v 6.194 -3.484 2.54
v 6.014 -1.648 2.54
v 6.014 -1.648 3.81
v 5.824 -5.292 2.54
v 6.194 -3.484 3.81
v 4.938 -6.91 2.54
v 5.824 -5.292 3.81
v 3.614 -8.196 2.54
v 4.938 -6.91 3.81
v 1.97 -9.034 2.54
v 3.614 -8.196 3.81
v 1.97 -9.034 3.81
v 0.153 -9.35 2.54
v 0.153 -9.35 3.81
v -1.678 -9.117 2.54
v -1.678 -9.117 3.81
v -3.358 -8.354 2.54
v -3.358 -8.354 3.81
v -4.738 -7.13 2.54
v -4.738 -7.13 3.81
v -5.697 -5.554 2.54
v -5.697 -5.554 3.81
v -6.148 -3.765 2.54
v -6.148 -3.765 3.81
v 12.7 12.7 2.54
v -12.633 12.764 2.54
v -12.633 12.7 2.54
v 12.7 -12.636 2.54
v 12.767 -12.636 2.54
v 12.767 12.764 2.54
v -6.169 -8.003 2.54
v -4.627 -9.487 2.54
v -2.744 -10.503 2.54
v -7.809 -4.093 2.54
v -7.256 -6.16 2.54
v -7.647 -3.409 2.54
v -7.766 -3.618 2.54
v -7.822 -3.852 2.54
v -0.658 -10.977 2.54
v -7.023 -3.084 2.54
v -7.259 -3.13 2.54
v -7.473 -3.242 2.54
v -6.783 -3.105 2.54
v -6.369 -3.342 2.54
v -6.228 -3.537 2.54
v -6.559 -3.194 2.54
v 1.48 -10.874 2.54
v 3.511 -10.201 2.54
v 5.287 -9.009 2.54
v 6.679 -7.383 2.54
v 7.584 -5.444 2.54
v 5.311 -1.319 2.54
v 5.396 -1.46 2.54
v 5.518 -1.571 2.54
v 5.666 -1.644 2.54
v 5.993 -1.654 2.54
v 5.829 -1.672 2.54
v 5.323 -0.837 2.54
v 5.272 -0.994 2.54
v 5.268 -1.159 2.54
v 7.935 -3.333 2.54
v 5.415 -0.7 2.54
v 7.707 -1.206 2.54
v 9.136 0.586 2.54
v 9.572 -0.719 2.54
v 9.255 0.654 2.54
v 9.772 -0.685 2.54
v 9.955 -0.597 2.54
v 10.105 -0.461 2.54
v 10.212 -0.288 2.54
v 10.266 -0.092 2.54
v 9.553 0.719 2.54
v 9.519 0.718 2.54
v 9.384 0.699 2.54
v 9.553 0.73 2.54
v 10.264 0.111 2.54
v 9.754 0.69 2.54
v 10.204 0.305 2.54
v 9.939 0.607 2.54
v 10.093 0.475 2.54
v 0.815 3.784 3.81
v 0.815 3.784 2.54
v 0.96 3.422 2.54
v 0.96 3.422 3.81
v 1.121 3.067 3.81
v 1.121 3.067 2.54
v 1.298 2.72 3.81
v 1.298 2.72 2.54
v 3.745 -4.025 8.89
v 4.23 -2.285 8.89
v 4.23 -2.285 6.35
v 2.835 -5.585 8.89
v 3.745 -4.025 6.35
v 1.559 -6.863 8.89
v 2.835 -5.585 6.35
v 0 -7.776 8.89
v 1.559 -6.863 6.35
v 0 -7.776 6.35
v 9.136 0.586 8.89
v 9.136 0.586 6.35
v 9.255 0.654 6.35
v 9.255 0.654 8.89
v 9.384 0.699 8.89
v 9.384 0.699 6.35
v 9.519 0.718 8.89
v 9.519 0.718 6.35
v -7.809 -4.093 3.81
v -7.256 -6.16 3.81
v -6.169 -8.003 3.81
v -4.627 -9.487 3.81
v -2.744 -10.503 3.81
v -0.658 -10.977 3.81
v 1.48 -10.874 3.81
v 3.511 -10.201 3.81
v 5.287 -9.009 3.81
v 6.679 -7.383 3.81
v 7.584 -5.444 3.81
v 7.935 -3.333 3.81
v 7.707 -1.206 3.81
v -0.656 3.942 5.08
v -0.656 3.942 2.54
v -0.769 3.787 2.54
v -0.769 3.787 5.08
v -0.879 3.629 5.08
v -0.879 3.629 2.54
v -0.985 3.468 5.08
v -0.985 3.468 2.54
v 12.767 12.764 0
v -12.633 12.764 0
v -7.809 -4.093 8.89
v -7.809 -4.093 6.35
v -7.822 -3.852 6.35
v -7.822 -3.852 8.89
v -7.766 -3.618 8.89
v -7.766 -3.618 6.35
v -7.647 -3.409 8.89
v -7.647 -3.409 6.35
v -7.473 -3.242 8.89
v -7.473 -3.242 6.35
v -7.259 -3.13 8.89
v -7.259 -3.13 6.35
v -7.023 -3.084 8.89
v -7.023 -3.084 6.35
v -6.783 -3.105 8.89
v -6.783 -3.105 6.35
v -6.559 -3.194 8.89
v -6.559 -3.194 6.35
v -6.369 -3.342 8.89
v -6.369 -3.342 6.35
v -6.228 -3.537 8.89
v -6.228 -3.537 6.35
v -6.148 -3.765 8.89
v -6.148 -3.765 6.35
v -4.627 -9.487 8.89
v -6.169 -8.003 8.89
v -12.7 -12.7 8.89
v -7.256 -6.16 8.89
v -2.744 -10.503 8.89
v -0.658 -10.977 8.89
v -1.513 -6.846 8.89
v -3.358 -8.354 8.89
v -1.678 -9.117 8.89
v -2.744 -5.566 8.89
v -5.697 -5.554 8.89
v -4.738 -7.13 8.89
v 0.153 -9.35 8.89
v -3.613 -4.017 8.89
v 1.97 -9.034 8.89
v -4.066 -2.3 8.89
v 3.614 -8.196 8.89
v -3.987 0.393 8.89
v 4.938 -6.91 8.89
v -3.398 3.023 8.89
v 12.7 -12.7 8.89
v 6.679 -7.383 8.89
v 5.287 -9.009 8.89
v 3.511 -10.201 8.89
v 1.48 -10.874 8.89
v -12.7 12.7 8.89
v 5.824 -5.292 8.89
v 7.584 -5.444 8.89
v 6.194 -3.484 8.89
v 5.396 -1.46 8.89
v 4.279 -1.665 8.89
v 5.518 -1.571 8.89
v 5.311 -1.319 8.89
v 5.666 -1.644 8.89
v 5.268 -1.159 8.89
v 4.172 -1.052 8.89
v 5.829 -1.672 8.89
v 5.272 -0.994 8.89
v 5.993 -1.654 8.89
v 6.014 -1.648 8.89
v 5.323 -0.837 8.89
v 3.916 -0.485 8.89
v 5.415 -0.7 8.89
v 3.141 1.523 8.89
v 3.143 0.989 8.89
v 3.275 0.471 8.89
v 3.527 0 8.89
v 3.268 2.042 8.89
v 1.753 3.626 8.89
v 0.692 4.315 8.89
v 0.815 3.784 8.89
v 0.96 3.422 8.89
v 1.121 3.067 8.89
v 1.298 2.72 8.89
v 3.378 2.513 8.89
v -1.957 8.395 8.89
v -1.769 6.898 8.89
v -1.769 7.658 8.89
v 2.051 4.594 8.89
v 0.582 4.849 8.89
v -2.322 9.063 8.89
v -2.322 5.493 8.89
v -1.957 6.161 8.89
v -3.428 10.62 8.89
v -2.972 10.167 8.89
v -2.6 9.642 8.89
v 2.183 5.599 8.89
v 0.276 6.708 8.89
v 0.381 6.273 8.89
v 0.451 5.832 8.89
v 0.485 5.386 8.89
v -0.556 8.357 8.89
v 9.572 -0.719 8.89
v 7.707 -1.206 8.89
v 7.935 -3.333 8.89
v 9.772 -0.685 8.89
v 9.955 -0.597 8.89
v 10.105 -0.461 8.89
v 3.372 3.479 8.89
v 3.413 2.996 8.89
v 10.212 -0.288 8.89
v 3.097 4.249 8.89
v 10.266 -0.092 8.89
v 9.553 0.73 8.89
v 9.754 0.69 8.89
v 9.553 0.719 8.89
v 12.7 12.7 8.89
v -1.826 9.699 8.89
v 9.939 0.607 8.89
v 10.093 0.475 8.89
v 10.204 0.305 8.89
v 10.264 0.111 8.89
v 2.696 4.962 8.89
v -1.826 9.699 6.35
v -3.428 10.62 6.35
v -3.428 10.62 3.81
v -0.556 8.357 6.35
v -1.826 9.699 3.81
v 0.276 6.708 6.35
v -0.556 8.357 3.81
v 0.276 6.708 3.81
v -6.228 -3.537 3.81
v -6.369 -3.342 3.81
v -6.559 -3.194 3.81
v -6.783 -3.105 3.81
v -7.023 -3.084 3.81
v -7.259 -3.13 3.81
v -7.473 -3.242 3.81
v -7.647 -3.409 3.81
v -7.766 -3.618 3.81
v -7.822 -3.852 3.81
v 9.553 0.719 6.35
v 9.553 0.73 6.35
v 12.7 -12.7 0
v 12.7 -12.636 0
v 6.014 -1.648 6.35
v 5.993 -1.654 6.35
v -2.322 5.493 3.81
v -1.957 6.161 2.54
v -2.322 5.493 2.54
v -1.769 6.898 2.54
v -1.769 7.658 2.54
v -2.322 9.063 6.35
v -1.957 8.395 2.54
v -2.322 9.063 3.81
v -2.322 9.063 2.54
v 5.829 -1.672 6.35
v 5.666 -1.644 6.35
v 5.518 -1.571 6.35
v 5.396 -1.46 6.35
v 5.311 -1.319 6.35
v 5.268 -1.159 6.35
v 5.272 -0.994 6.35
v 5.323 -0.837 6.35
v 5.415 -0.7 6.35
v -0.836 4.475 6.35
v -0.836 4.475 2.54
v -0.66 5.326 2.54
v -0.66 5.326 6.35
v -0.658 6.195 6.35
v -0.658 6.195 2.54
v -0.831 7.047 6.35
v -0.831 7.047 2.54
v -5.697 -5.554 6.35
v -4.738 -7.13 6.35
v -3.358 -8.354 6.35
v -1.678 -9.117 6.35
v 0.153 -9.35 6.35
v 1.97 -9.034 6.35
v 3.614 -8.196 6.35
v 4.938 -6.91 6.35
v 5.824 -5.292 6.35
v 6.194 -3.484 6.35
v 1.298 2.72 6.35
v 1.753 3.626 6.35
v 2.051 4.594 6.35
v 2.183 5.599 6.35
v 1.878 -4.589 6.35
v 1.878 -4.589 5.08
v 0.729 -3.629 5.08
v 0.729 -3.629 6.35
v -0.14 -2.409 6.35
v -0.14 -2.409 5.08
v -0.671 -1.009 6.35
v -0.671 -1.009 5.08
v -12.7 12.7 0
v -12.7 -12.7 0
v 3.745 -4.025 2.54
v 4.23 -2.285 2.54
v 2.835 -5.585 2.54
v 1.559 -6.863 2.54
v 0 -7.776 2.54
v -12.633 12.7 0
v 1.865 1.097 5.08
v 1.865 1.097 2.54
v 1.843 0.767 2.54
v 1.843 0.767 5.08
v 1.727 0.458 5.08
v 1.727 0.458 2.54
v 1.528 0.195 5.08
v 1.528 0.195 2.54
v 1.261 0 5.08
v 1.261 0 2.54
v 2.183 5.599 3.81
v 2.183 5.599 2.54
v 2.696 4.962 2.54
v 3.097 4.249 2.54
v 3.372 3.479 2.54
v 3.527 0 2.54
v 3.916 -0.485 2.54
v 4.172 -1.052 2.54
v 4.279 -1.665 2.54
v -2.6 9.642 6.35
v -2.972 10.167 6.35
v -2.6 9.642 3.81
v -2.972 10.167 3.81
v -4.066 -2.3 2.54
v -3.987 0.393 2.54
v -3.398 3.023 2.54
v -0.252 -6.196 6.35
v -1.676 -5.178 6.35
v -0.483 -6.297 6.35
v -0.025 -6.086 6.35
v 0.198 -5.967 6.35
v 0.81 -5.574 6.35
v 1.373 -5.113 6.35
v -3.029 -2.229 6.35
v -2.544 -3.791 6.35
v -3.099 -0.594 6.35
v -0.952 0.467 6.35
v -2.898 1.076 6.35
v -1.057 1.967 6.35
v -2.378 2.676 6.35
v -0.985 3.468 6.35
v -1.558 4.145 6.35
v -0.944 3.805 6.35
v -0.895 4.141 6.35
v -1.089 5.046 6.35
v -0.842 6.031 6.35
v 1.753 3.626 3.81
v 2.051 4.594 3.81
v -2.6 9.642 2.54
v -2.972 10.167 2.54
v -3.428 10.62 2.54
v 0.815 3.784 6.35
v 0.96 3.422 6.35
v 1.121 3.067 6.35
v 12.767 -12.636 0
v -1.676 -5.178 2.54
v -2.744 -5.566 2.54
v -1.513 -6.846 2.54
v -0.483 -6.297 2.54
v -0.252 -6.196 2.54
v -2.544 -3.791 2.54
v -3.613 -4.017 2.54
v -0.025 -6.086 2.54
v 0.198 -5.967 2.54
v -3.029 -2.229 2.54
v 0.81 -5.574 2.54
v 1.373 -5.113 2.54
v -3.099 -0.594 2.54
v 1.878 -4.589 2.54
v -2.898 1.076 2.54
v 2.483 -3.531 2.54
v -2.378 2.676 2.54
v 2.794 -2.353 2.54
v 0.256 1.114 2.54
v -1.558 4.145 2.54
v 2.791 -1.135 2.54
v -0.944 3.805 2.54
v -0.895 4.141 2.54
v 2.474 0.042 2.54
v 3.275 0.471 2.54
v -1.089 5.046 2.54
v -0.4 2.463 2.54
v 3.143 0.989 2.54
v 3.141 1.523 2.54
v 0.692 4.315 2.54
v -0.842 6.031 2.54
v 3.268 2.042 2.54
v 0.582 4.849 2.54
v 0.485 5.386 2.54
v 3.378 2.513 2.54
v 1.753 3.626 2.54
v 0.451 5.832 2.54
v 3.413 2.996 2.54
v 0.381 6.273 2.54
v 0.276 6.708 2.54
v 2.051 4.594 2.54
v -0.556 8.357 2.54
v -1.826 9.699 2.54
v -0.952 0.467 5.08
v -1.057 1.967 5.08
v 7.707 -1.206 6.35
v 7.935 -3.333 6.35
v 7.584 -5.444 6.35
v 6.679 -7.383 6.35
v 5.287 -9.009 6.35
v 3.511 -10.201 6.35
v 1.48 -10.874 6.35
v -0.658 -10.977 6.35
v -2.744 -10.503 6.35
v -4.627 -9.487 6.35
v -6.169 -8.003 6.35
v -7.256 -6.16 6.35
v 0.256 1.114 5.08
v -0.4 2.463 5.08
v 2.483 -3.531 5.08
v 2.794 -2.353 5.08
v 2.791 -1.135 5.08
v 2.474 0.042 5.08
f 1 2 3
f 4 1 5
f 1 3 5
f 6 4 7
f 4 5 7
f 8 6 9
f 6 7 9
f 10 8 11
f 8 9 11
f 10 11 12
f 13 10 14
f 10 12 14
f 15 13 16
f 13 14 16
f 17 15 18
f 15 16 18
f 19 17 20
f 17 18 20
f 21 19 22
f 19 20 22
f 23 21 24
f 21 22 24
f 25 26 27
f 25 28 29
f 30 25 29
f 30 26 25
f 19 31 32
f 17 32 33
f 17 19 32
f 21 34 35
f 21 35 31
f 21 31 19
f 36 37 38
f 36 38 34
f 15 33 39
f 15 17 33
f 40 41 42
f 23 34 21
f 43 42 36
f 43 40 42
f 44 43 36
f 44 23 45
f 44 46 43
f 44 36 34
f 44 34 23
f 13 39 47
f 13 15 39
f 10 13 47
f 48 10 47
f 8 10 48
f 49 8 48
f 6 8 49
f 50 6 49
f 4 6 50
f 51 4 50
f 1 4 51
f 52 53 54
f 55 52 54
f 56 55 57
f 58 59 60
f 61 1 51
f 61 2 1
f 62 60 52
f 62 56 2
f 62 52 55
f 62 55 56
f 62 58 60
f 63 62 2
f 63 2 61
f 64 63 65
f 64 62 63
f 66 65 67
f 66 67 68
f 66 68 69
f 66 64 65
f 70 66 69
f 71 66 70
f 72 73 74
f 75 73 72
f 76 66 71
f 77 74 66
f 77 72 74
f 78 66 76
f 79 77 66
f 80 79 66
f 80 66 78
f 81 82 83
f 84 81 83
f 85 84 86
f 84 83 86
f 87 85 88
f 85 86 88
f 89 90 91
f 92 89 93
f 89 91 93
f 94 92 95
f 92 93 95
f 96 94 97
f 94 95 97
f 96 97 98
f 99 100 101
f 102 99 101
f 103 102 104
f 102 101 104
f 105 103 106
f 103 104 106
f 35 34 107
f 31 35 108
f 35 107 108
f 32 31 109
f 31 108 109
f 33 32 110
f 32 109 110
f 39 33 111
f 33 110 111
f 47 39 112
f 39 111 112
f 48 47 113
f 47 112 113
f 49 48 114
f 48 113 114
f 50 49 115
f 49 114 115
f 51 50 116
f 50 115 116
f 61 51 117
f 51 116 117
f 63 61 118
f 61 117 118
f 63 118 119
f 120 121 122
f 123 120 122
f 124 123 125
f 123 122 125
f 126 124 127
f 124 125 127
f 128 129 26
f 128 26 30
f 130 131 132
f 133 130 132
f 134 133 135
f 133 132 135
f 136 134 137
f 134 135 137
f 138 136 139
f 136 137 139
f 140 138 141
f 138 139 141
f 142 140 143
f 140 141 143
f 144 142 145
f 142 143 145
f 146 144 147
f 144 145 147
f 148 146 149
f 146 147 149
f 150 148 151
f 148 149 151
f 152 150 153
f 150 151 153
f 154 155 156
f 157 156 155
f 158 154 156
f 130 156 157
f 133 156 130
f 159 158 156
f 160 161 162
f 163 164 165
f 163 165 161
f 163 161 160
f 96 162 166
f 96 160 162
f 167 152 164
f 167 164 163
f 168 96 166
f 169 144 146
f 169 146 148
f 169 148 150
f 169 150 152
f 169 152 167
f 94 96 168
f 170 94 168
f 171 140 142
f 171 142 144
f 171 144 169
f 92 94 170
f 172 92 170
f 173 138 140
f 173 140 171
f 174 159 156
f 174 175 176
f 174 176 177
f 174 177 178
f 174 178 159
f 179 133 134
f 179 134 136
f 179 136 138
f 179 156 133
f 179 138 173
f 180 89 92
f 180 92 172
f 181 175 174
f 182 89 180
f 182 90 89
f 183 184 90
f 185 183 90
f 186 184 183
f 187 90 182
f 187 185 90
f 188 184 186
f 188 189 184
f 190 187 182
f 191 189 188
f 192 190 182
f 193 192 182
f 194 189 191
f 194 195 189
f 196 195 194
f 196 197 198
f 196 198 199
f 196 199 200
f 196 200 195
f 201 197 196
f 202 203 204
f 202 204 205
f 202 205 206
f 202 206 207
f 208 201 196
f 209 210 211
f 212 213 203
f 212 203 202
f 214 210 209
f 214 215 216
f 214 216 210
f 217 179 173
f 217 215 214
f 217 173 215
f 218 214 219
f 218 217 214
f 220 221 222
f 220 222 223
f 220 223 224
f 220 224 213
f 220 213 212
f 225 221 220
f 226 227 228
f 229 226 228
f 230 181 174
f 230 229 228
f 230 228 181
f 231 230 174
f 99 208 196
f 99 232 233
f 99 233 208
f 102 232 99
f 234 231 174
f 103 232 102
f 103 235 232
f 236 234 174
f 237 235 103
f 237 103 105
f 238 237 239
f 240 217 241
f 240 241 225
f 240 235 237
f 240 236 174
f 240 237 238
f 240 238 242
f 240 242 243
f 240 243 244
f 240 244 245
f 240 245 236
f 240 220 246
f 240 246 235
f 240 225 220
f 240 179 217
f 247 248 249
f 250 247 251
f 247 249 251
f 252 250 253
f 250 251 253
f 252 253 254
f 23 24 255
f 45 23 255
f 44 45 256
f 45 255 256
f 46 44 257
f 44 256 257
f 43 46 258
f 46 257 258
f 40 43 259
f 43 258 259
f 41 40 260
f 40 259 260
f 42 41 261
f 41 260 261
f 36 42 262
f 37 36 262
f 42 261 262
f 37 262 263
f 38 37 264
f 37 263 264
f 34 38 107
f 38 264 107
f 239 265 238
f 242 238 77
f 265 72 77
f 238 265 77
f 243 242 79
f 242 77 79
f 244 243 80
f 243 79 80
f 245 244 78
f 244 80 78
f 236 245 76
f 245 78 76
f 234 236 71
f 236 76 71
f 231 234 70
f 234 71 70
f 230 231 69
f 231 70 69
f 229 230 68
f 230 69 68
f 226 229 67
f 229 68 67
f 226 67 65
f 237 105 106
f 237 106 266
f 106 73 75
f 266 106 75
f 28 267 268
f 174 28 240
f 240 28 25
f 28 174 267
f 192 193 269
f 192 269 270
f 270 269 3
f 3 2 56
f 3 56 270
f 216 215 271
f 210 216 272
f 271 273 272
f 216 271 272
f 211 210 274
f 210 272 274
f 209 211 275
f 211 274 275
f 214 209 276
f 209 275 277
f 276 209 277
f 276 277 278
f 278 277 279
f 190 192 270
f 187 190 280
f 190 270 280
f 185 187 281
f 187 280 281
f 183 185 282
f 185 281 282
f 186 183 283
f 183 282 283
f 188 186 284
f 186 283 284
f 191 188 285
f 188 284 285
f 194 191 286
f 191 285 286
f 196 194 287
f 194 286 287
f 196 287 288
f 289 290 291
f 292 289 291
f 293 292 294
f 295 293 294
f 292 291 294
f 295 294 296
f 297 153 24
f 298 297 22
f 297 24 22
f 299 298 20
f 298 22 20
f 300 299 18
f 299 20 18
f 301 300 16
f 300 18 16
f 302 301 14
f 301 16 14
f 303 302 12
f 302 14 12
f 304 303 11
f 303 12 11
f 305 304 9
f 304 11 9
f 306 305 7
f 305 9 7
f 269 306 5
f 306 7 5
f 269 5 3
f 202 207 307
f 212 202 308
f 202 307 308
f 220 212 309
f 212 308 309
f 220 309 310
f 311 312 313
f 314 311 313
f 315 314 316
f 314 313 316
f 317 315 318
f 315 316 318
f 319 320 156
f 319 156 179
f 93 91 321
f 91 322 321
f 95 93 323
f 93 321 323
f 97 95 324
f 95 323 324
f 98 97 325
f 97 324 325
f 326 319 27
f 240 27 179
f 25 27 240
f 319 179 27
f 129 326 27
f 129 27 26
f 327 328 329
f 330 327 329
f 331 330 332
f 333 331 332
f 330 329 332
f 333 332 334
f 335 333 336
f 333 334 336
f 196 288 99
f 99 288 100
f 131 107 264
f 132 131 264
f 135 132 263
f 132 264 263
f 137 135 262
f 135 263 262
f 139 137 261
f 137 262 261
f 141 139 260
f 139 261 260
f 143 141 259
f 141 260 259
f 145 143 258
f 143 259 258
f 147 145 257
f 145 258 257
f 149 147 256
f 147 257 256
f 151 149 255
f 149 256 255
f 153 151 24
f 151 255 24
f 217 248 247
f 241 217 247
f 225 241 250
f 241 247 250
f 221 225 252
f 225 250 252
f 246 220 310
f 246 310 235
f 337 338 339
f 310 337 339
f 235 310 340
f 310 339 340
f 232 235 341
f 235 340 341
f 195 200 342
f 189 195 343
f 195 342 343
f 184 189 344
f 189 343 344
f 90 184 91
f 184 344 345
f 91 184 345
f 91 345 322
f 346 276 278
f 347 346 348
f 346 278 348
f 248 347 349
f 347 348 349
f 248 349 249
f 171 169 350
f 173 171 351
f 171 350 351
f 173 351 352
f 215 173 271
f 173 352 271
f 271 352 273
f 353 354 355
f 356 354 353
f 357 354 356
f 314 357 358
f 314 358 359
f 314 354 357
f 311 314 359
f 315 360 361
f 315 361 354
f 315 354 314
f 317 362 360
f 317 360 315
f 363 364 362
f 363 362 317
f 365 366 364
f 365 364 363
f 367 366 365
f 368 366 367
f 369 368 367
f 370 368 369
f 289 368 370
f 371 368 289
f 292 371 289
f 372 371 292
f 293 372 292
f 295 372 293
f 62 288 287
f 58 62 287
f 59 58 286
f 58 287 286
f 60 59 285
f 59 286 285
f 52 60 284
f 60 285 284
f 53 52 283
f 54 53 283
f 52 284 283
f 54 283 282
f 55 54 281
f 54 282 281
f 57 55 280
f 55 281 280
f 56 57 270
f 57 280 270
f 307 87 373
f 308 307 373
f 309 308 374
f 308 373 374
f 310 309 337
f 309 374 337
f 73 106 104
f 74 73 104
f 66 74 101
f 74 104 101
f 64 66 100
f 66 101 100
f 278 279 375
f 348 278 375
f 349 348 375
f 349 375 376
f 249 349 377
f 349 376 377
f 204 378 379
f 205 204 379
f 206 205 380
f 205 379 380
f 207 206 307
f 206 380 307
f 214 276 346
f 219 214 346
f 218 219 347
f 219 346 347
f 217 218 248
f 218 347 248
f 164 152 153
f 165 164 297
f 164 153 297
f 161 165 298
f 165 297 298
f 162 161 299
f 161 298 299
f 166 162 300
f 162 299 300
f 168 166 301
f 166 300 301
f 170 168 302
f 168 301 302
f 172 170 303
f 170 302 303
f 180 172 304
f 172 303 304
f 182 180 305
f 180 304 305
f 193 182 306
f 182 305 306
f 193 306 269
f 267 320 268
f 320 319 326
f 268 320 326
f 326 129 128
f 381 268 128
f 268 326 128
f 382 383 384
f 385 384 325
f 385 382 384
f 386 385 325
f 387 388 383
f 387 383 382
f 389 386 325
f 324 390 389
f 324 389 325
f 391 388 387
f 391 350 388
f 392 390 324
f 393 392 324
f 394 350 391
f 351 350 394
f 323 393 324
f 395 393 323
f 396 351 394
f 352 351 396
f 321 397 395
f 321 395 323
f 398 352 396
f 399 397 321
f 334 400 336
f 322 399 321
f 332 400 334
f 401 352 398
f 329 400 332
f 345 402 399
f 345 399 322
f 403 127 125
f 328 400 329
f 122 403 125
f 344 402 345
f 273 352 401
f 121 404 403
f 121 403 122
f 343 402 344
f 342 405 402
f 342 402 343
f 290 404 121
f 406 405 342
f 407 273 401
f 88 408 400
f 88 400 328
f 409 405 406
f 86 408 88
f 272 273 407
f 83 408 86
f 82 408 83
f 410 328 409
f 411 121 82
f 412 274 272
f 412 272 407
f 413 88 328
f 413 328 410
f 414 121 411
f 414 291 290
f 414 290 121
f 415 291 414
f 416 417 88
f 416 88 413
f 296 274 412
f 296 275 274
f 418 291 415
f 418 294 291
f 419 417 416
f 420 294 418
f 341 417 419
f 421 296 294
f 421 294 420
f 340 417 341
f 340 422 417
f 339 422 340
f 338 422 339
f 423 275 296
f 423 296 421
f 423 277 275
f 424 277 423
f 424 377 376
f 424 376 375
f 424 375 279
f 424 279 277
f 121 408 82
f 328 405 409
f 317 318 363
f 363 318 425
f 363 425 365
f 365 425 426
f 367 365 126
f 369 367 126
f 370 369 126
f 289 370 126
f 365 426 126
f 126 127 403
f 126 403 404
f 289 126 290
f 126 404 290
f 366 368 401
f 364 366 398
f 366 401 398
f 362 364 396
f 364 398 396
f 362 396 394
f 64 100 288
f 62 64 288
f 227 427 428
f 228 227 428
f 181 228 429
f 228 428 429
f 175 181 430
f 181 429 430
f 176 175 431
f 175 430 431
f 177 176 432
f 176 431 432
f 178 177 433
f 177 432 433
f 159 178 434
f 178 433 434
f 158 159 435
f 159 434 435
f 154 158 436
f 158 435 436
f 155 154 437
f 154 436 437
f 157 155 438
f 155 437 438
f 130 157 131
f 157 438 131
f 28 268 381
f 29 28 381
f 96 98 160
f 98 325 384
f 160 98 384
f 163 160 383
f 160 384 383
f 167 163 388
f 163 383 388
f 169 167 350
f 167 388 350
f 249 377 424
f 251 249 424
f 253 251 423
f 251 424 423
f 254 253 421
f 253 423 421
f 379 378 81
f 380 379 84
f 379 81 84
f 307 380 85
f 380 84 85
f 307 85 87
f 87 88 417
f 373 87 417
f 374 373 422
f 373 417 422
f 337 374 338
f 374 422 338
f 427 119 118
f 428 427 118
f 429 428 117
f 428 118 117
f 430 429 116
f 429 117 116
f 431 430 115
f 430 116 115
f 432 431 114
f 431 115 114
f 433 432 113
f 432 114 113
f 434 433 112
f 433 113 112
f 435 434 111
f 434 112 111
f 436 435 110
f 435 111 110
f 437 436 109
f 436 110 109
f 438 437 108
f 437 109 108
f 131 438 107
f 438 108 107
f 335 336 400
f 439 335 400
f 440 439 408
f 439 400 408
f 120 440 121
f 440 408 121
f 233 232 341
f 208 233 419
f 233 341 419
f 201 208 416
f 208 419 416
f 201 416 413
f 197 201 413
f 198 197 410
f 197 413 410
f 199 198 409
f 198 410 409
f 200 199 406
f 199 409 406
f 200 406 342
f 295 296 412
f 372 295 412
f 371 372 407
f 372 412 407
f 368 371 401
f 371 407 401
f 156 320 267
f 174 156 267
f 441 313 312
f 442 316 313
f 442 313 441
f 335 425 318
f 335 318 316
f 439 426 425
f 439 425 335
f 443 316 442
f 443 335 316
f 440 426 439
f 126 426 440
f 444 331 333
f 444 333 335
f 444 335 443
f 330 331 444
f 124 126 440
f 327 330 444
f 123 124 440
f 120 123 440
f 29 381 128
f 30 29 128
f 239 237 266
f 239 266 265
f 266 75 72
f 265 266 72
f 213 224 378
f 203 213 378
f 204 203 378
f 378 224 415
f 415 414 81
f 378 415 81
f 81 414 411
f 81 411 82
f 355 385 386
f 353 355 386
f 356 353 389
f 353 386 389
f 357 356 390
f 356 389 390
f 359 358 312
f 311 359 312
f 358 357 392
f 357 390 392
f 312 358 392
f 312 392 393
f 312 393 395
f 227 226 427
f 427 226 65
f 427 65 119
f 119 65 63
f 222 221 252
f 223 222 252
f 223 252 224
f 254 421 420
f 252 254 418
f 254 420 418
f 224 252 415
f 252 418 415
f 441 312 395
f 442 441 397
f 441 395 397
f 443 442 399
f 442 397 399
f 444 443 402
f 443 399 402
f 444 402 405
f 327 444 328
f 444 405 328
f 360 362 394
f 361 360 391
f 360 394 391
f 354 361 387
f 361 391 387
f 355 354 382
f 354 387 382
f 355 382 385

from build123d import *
from build123d import SkipClean  # not in build123d's __all__

# Parameters (mm, degrees)
F0_W      = 25.4
F0_H      = 25.4
F1_DEPTH  = 3.81
F3_DEPTH  = 6.35
F4_W      = 25.4
F4_H      = 25.4
F1_FACE_W = 25.4
F1_FACE_H = 25.4
F5_DEPTH  = 2.54
F7_DEPTH  = 3.81
F5_FACE_W = 25.4
F5_FACE_H = 25.4
F8_DEPTH  = 2.54
F9_DEPTH  = 6.35
F10_DEPTH = 5.08


# Not quite as in the source:
# - a feature names something its author has since deleted; it is built from what else it names


with BuildPart() as f1:
    # F0 (on Top) → F1 (new body)
    with BuildSketch(Plane.XY):
        Rectangle(F0_W, F0_H)
        with BuildLine():
            ThreePointArc((-2.3220747757, 5.493318662), (-1.7452180631, 7.2779146179), (-2.3220747757, 9.0625105738))
            ThreePointArc((-2.3220747757, 9.0625105738), (-2.7746823601, 9.912386532), (-3.427619813, 10.62006969))
            ThreePointArc((-3.427619813, 10.62006969), (-1.1425772736, 9.0743071478), (0.2757107432, 6.7080315202))
            ThreePointArc((0.2757107432, 6.7080315202), (0.4204105595, 6.0532877613), (0.4851105891, 5.3858738471))
            ThreePointArc((0.4851105891, 5.3858738471), (0.6353827008, 4.5817890382), (0.8147705941, 3.7836950142))
            ThreePointArc((0.8147705941, 3.7836950142), (1.0381967432, 3.2437817697), (1.2981665786, 2.7204833459))
            ThreePointArc((1.2981665786, 2.7204833459), (1.922383445, 4.1038367613), (2.1830380429, 5.5989529938))
            ThreePointArc((2.1830380429, 5.5989529938), (2.9114948167, 4.6138465954), (3.372413034, 3.4786645464))
            ThreePointArc((3.372413034, 3.4786645464), (3.4051009388, 2.7541360468), (3.2676233133, 2.0420195197))
            ThreePointArc((3.2676233133, 2.0420195197), (3.1432548322, 0.9887032001), (3.5271933302, 0))
            ThreePointArc((3.5271933302, 0), (4.1724784116, -1.0519502273), (4.2296264741, -2.2847219888))
            ThreePointArc((4.2296264741, -2.2847219888), (2.8346650657, -5.5849174863), (0, -7.7762370929))
            ThreePointArc((0, -7.7762370929), (-2.7435493808, -5.5658105565), (-4.0658875369, -2.3001604713))
            ThreePointArc((-4.0658875369, -2.3001604713), (-3.7552495624, 1.7221644716), (-2.3220747757, 5.493318662))
        make_face(mode=Mode.SUBTRACT)
    extrude(amount=F1_DEPTH)

    # F2 (on face) → F3 (cut)
    with BuildSketch(Plane.XY.offset(3.81)):
        with BuildLine():
            ThreePointArc((-6.1483882188, -3.7645904891), (-7.1429274149, -3.0984661258), (-7.8090517782, -4.0930053219))
            ThreePointArc((-7.8090517782, -4.0930053219), (1.9937266905, -10.7603517397), (7.3875300738, -0.2031334023))
            ThreePointArc((7.3875300738, -0.2031334023), (6.5005634578, -0.4457360723), (5.8456538245, -1.0912275175))
            ThreePointArc((5.8456538245, -1.0912275175), (1.3588648275, -9.2035644572), (-6.1483882188, -3.7645904891))
        make_face()
    extrude(amount=-F3_DEPTH, mode=Mode.SUBTRACT)



with BuildPart() as f1b:
    # F0 (on Top) → F1, piece 2 (new body)
    with BuildSketch(Plane.XY):
        with BuildLine():
            ThreePointArc((1.2607348617, 0), (-0.1199112872, 1.7654494083), (-0.65563916, 3.941682633))
            ThreePointArc((-0.65563916, 3.941682633), (-0.8248612998, 3.7079174894), (-0.9848921893, 3.4677667255))
            ThreePointArc((-0.9848921893, 3.4677667255), (-1.0263163384, 1.2153133206), (-0.671251677, -1.009364496))
            ThreePointArc((-0.671251677, -1.009364496), (0.2551522442, -3.0470440914), (1.8780454732, -4.5886601027))
            ThreePointArc((1.8780454732, -4.5886601027), (2.8324677453, -1.7438067709), (1.8650756683, 1.0966623668))
            ThreePointArc((1.8650756683, 1.0966623668), (1.7272115994, 0.4577864308), (1.2607348617, 0))
        make_face()
        with BuildLine():
            ThreePointArc((-0.671251677, -1.009364496), (-1.0263163384, 1.2153133206), (-0.9848921893, 3.4677667255))
            ThreePointArc((-0.9848921893, 3.4677667255), (-2.0972329272, -1.4632517602), (0.1975684196, -5.9672646379))
            ThreePointArc((0.1975684196, -5.9672646379), (1.0982734454, -5.351669196), (1.8780454732, -4.5886601027))
            ThreePointArc((1.8780454732, -4.5886601027), (0.2551522442, -3.0470440914), (-0.671251677, -1.009364496))
        make_face()
        with BuildLine():
            ThreePointArc((0.1975684196, -5.9672646379), (-2.0972329272, -1.4632517602), (-0.9848921893, 3.4677667255))
            ThreePointArc((-0.9848921893, 3.4677667255), (-0.9205654294, 3.97292477), (-0.8361481014, 4.4751162641))
            ThreePointArc((-0.8361481014, 4.4751162641), (-0.6366469014, 5.7604618421), (-0.8311524871, 7.0465728641))
            ThreePointArc((-0.8311524871, 7.0465728641), (-0.9366764425, 5.531166985), (-1.5578314768, 4.1448925869))
            ThreePointArc((-1.5578314768, 4.1448925869), (-2.6769387693, 1.8887344687), (-3.0985642225, -0.5941836862))
            ThreePointArc((-3.0985642225, -0.5941836862), (-2.5441879685, -3.7912333048), (-0.4829827521, -6.2972046435))
            ThreePointArc((-0.4829827521, -6.2972046435), (-0.1377056519, -6.1425510207), (0.1975684196, -5.9672646379))
        make_face()
    extrude(amount=F1_DEPTH)


with BuildPart() as f1_1:
    add(f1.part, clean=False)

    with SkipClean():  # cleaning this boolean's faces spoils the solid; the shape is the same uncleaned
        add(f1b.part)  # F5 merges F1b
    # F4 (on Top) + F1_face (on face) → F5 (join)
    with BuildSketch(Plane.XY):
        with Locations((0.066815722, 0.0637920246)):
            Rectangle(F4_W, F4_H)
    with BuildSketch(Plane(origin=(0.026992419, 0.041114738, 3.81), x_dir=(1, 0, 0), z_dir=(0, 0, 1))):
        with Locations((-0.026992419, -0.041114738)):
            Rectangle(F1_FACE_W, F1_FACE_H)
        with BuildLine():
            ThreePointArc((-7.8360441972, -4.1341200599), (-7.1699198339, -3.1395808638), (-6.1753806378, -3.805705227))
            ThreePointArc((-6.1753806378, -3.805705227), (1.3318724085, -9.2446791952), (5.8186614055, -1.1323422554))
            ThreePointArc((5.8186614055, -1.1323422554), (6.4735710387, -0.4868508103), (7.3605376548, -0.2442481402))
            ThreePointArc((7.3605376548, -0.2442481402), (1.9667342715, -10.8014664776), (-7.8360441972, -4.1341200599))
        make_face(mode=Mode.SUBTRACT)
        with BuildLine():
            ThreePointArc((-0.026992419, -7.8173518309), (-2.7705417999, -5.6069252945), (-4.0928799559, -2.3412752093))
            ThreePointArc((-4.0928799559, -2.3412752093), (-3.7822419814, 1.6810497336), (-2.3490671947, 5.4522039241))
            ThreePointArc((-2.3490671947, 5.4522039241), (-1.7722104822, 7.23679988), (-2.3490671947, 9.0213958359))
            ThreePointArc((-2.3490671947, 9.0213958359), (-2.8016747791, 9.871271794), (-3.454612232, 10.5789549521))
            ThreePointArc((-3.454612232, 10.5789549521), (-1.1695696926, 9.0331924098), (0.2487183241, 6.6669167823))
            ThreePointArc((0.2487183241, 6.6669167823), (0.3934181404, 6.0121730233), (0.4581181701, 5.3447591091))
            ThreePointArc((0.4581181701, 5.3447591091), (0.6083902818, 4.5406743002), (0.787778175, 3.7425802762))
            ThreePointArc((0.787778175, 3.7425802762), (1.0112043242, 3.2026670317), (1.2711741596, 2.6793686079))
            ThreePointArc((1.2711741596, 2.6793686079), (1.895391026, 4.0627220233), (2.1560456238, 5.5578382558))
            ThreePointArc((2.1560456238, 5.5578382558), (2.8845023977, 4.5727318574), (3.345420615, 3.4375498084))
            ThreePointArc((3.345420615, 3.4375498084), (3.3781085198, 2.7130213089), (3.2406308943, 2.0009047817))
            ThreePointArc((3.2406308943, 2.0009047817), (3.1162624132, 0.9475884621), (3.5002009112, -0.041114738))
            ThreePointArc((3.5002009112, -0.041114738), (4.1454859925, -1.0930649653), (4.2026340551, -2.3258367268))
            ThreePointArc((4.2026340551, -2.3258367268), (2.8076726467, -5.6260322243), (-0.026992419, -7.8173518309))
        make_face(mode=Mode.SUBTRACT)
    with SkipClean():  # cleaning this boolean's faces spoils the solid; the shape is the same uncleaned
        extrude(amount=F5_DEPTH)

    # F6 (on face) → F7 (cut)
    with BuildSketch(Plane.XY.offset(6.35)):
        with BuildLine():
            Line((9.553141892, 0.7298990968), (9.5194935584, 0.7182694883))
            ThreePointArc((9.5194935584, 0.7182694883), (9.5363131156, 0.7188602509), (9.553141892, 0.7190572078))
            Line((9.553141892, 0.7190572078), (9.553141892, 0.7298990968))
        make_face()
        with BuildLine():
            Line((9.1360899218, 0.5857567091), (5.4154974922, -0.7001623479))
            ThreePointArc((5.4154974922, -0.7001623479), (5.3482937998, -1.3922249308), (5.9925724035, -1.6537053999))
            Line((5.9925724035, -1.6537053999), (6.0142811862, -1.6480350907))
            ThreePointArc((6.0142811862, -1.6480350907), (5.9365127083, -1.3676491107), (5.8456538245, -1.0912275175))
            ThreePointArc((5.8456538245, -1.0912275175), (6.5005634578, -0.4457360723), (7.3875300738, -0.2031334023))
            ThreePointArc((7.3875300738, -0.2031334023), (7.5642186753, -0.6991201958), (7.7074975952, -1.2057689028))
            Line((7.7074975952, -1.2057689028), (9.5718006466, -0.7188150798))
            ThreePointArc((9.5718006466, -0.7188150798), (10.2721385652, 0.0093301628), (9.553141892, 0.7190572078))
            ThreePointArc((9.553141892, 0.7190572078), (9.5363131156, 0.7188602509), (9.5194935584, 0.7182694883))
            ThreePointArc((9.5194935584, 0.7182694883), (9.3182534076, 0.6796106738), (9.1360899218, 0.5857567091))
        make_face()
    with SkipClean():  # cleaning this boolean's faces spoils the solid; the shape is the same uncleaned
        extrude(amount=-F7_DEPTH, mode=Mode.SUBTRACT)

    # F0 (on Top) + F5_face (on face) → F8 (join)
    with BuildSketch(Plane.XY):
        with BuildLine():
            ThreePointArc((1.2607348617, 0), (-0.1199112872, 1.7654494083), (-0.65563916, 3.941682633))
            ThreePointArc((-0.65563916, 3.941682633), (-0.8248612998, 3.7079174894), (-0.9848921893, 3.4677667255))
            ThreePointArc((-0.9848921893, 3.4677667255), (-1.0263163384, 1.2153133206), (-0.671251677, -1.009364496))
            ThreePointArc((-0.671251677, -1.009364496), (0.2551522442, -3.0470440914), (1.8780454732, -4.5886601027))
            ThreePointArc((1.8780454732, -4.5886601027), (2.8324677453, -1.7438067709), (1.8650756683, 1.0966623668))
            ThreePointArc((1.8650756683, 1.0966623668), (1.7272115994, 0.4577864308), (1.2607348617, 0))
        make_face()
    with BuildSketch(Plane(origin=(-0.0427124334, 0.6105090747, 6.35), x_dir=(1, 0, 0), z_dir=(0, 0, 1))):
        with Locations((0.0427124334, -0.6105090747)):
            Rectangle(F5_FACE_W, F5_FACE_H)
        with BuildLine():
            ThreePointArc((-6.1056757855, -4.3750995638), (1.1161658852, -9.8706825468), (6.0569936196, -2.2585441654))
            Line((6.0569936196, -2.2585441654), (6.0352848369, -2.2642144746))
            ThreePointArc((6.0352848369, -2.2642144746), (5.3910062331, -2.0027340055), (5.4582099255, -1.3106714226))
            Line((5.4582099255, -1.3106714226), (9.1788023552, -0.0247523655))
            ThreePointArc((9.1788023552, -0.0247523655), (9.3609658409, 0.0691015992), (9.5622059917, 0.1077604136))
            Line((9.5622059917, 0.1077604136), (9.5958543253, 0.1193900221))
            Line((9.5958543253, 0.1193900221), (9.5958543253, 0.1085481331))
            ThreePointArc((9.5958543253, 0.1085481331), (10.3148509986, -0.6011789119), (9.61451308, -1.3293241545))
            Line((9.61451308, -1.3293241545), (7.7502100286, -1.8162779775))
            ThreePointArc((7.7502100286, -1.8162779775), (1.5223004235, -11.4843648142), (-7.7663393448, -4.7035143966))
            ThreePointArc((-7.7663393448, -4.7035143966), (-7.1002149816, -3.7089752005), (-6.1056757855, -4.3750995638))
        make_face(mode=Mode.SUBTRACT)
        with BuildLine():
            ThreePointArc((2.2257504762, 4.9884439191), (2.9542072501, 4.0033375207), (3.4151254674, 2.8681554717))
            ThreePointArc((3.4151254674, 2.8681554717), (3.4478133722, 2.1436269722), (3.3103357467, 1.431510445))
            ThreePointArc((3.3103357467, 1.431510445), (3.1859672656, 0.3781941254), (3.5699057636, -0.6105090747))
            ThreePointArc((3.5699057636, -0.6105090747), (4.2151908449, -1.662459302), (4.2723389075, -2.8952310635))
            ThreePointArc((4.2723389075, -2.8952310635), (2.877377499, -6.195426561), (0.0427124334, -8.3867461676))
            ThreePointArc((0.0427124334, -8.3867461676), (-2.7008369475, -6.1763196312), (-4.0231751035, -2.910669546))
            ThreePointArc((-4.0231751035, -2.910669546), (-3.712537129, 1.1116553969), (-2.2793623423, 4.8828095874))
            ThreePointArc((-2.2793623423, 4.8828095874), (-1.7025056298, 6.6674055433), (-2.2793623423, 8.4520014992))
            ThreePointArc((-2.2793623423, 8.4520014992), (-2.7319699267, 9.3018774573), (-3.3849073797, 10.0095606154))
            ThreePointArc((-3.3849073797, 10.0095606154), (-1.0998648402, 8.4637980731), (0.3184231765, 6.0975224456))
            ThreePointArc((0.3184231765, 6.0975224456), (0.4631229928, 5.4427786866), (0.5278230225, 4.7753647724))
            ThreePointArc((0.5278230225, 4.7753647724), (0.6780951342, 3.9712799635), (0.8574830274, 3.1731859395))
            ThreePointArc((0.8574830274, 3.1731859395), (1.0809091765, 2.633272695), (1.340879012, 2.1099742712))
            ThreePointArc((1.340879012, 2.1099742712), (1.9650958783, 3.4933276866), (2.2257504762, 4.9884439191))
        make_face(mode=Mode.SUBTRACT)
    extrude(amount=F8_DEPTH)

    # F0 (on Top) → F9 (join)
    with BuildSketch(Plane.XY):
        with BuildLine():
            ThreePointArc((0.1975684196, -5.9672646379), (-2.0972329272, -1.4632517602), (-0.9848921893, 3.4677667255))
            ThreePointArc((-0.9848921893, 3.4677667255), (-0.9205654294, 3.97292477), (-0.8361481014, 4.4751162641))
            ThreePointArc((-0.8361481014, 4.4751162641), (-0.6366469014, 5.7604618421), (-0.8311524871, 7.0465728641))
            ThreePointArc((-0.8311524871, 7.0465728641), (-0.9366764425, 5.531166985), (-1.5578314768, 4.1448925869))
            ThreePointArc((-1.5578314768, 4.1448925869), (-2.6769387693, 1.8887344687), (-3.0985642225, -0.5941836862))
            ThreePointArc((-3.0985642225, -0.5941836862), (-2.5441879685, -3.7912333048), (-0.4829827521, -6.2972046435))
            ThreePointArc((-0.4829827521, -6.2972046435), (-0.1377056519, -6.1425510207), (0.1975684196, -5.9672646379))
        make_face()
        with BuildLine():
            ThreePointArc((-0.671251677, -1.009364496), (-1.0263163384, 1.2153133206), (-0.9848921893, 3.4677667255))
            ThreePointArc((-0.9848921893, 3.4677667255), (-2.0972329272, -1.4632517602), (0.1975684196, -5.9672646379))
            ThreePointArc((0.1975684196, -5.9672646379), (1.0982734454, -5.351669196), (1.8780454732, -4.5886601027))
            ThreePointArc((1.8780454732, -4.5886601027), (0.2551522442, -3.0470440914), (-0.671251677, -1.009364496))
        make_face()
    extrude(amount=F9_DEPTH)

    # F0 (on Top) → F10 (join)
    with BuildSketch(Plane.XY):
        with BuildLine():
            ThreePointArc((1.2607348617, 0), (-0.1199112872, 1.7654494083), (-0.65563916, 3.941682633))
            ThreePointArc((-0.65563916, 3.941682633), (-0.8248612998, 3.7079174894), (-0.9848921893, 3.4677667255))
            ThreePointArc((-0.9848921893, 3.4677667255), (-1.0263163384, 1.2153133206), (-0.671251677, -1.009364496))
            ThreePointArc((-0.671251677, -1.009364496), (0.2551522442, -3.0470440914), (1.8780454732, -4.5886601027))
            ThreePointArc((1.8780454732, -4.5886601027), (2.8324677453, -1.7438067709), (1.8650756683, 1.0966623668))
            ThreePointArc((1.8650756683, 1.0966623668), (1.7272115994, 0.4577864308), (1.2607348617, 0))
        make_face()
    extrude(amount=F10_DEPTH)


solid = f1_1.part
